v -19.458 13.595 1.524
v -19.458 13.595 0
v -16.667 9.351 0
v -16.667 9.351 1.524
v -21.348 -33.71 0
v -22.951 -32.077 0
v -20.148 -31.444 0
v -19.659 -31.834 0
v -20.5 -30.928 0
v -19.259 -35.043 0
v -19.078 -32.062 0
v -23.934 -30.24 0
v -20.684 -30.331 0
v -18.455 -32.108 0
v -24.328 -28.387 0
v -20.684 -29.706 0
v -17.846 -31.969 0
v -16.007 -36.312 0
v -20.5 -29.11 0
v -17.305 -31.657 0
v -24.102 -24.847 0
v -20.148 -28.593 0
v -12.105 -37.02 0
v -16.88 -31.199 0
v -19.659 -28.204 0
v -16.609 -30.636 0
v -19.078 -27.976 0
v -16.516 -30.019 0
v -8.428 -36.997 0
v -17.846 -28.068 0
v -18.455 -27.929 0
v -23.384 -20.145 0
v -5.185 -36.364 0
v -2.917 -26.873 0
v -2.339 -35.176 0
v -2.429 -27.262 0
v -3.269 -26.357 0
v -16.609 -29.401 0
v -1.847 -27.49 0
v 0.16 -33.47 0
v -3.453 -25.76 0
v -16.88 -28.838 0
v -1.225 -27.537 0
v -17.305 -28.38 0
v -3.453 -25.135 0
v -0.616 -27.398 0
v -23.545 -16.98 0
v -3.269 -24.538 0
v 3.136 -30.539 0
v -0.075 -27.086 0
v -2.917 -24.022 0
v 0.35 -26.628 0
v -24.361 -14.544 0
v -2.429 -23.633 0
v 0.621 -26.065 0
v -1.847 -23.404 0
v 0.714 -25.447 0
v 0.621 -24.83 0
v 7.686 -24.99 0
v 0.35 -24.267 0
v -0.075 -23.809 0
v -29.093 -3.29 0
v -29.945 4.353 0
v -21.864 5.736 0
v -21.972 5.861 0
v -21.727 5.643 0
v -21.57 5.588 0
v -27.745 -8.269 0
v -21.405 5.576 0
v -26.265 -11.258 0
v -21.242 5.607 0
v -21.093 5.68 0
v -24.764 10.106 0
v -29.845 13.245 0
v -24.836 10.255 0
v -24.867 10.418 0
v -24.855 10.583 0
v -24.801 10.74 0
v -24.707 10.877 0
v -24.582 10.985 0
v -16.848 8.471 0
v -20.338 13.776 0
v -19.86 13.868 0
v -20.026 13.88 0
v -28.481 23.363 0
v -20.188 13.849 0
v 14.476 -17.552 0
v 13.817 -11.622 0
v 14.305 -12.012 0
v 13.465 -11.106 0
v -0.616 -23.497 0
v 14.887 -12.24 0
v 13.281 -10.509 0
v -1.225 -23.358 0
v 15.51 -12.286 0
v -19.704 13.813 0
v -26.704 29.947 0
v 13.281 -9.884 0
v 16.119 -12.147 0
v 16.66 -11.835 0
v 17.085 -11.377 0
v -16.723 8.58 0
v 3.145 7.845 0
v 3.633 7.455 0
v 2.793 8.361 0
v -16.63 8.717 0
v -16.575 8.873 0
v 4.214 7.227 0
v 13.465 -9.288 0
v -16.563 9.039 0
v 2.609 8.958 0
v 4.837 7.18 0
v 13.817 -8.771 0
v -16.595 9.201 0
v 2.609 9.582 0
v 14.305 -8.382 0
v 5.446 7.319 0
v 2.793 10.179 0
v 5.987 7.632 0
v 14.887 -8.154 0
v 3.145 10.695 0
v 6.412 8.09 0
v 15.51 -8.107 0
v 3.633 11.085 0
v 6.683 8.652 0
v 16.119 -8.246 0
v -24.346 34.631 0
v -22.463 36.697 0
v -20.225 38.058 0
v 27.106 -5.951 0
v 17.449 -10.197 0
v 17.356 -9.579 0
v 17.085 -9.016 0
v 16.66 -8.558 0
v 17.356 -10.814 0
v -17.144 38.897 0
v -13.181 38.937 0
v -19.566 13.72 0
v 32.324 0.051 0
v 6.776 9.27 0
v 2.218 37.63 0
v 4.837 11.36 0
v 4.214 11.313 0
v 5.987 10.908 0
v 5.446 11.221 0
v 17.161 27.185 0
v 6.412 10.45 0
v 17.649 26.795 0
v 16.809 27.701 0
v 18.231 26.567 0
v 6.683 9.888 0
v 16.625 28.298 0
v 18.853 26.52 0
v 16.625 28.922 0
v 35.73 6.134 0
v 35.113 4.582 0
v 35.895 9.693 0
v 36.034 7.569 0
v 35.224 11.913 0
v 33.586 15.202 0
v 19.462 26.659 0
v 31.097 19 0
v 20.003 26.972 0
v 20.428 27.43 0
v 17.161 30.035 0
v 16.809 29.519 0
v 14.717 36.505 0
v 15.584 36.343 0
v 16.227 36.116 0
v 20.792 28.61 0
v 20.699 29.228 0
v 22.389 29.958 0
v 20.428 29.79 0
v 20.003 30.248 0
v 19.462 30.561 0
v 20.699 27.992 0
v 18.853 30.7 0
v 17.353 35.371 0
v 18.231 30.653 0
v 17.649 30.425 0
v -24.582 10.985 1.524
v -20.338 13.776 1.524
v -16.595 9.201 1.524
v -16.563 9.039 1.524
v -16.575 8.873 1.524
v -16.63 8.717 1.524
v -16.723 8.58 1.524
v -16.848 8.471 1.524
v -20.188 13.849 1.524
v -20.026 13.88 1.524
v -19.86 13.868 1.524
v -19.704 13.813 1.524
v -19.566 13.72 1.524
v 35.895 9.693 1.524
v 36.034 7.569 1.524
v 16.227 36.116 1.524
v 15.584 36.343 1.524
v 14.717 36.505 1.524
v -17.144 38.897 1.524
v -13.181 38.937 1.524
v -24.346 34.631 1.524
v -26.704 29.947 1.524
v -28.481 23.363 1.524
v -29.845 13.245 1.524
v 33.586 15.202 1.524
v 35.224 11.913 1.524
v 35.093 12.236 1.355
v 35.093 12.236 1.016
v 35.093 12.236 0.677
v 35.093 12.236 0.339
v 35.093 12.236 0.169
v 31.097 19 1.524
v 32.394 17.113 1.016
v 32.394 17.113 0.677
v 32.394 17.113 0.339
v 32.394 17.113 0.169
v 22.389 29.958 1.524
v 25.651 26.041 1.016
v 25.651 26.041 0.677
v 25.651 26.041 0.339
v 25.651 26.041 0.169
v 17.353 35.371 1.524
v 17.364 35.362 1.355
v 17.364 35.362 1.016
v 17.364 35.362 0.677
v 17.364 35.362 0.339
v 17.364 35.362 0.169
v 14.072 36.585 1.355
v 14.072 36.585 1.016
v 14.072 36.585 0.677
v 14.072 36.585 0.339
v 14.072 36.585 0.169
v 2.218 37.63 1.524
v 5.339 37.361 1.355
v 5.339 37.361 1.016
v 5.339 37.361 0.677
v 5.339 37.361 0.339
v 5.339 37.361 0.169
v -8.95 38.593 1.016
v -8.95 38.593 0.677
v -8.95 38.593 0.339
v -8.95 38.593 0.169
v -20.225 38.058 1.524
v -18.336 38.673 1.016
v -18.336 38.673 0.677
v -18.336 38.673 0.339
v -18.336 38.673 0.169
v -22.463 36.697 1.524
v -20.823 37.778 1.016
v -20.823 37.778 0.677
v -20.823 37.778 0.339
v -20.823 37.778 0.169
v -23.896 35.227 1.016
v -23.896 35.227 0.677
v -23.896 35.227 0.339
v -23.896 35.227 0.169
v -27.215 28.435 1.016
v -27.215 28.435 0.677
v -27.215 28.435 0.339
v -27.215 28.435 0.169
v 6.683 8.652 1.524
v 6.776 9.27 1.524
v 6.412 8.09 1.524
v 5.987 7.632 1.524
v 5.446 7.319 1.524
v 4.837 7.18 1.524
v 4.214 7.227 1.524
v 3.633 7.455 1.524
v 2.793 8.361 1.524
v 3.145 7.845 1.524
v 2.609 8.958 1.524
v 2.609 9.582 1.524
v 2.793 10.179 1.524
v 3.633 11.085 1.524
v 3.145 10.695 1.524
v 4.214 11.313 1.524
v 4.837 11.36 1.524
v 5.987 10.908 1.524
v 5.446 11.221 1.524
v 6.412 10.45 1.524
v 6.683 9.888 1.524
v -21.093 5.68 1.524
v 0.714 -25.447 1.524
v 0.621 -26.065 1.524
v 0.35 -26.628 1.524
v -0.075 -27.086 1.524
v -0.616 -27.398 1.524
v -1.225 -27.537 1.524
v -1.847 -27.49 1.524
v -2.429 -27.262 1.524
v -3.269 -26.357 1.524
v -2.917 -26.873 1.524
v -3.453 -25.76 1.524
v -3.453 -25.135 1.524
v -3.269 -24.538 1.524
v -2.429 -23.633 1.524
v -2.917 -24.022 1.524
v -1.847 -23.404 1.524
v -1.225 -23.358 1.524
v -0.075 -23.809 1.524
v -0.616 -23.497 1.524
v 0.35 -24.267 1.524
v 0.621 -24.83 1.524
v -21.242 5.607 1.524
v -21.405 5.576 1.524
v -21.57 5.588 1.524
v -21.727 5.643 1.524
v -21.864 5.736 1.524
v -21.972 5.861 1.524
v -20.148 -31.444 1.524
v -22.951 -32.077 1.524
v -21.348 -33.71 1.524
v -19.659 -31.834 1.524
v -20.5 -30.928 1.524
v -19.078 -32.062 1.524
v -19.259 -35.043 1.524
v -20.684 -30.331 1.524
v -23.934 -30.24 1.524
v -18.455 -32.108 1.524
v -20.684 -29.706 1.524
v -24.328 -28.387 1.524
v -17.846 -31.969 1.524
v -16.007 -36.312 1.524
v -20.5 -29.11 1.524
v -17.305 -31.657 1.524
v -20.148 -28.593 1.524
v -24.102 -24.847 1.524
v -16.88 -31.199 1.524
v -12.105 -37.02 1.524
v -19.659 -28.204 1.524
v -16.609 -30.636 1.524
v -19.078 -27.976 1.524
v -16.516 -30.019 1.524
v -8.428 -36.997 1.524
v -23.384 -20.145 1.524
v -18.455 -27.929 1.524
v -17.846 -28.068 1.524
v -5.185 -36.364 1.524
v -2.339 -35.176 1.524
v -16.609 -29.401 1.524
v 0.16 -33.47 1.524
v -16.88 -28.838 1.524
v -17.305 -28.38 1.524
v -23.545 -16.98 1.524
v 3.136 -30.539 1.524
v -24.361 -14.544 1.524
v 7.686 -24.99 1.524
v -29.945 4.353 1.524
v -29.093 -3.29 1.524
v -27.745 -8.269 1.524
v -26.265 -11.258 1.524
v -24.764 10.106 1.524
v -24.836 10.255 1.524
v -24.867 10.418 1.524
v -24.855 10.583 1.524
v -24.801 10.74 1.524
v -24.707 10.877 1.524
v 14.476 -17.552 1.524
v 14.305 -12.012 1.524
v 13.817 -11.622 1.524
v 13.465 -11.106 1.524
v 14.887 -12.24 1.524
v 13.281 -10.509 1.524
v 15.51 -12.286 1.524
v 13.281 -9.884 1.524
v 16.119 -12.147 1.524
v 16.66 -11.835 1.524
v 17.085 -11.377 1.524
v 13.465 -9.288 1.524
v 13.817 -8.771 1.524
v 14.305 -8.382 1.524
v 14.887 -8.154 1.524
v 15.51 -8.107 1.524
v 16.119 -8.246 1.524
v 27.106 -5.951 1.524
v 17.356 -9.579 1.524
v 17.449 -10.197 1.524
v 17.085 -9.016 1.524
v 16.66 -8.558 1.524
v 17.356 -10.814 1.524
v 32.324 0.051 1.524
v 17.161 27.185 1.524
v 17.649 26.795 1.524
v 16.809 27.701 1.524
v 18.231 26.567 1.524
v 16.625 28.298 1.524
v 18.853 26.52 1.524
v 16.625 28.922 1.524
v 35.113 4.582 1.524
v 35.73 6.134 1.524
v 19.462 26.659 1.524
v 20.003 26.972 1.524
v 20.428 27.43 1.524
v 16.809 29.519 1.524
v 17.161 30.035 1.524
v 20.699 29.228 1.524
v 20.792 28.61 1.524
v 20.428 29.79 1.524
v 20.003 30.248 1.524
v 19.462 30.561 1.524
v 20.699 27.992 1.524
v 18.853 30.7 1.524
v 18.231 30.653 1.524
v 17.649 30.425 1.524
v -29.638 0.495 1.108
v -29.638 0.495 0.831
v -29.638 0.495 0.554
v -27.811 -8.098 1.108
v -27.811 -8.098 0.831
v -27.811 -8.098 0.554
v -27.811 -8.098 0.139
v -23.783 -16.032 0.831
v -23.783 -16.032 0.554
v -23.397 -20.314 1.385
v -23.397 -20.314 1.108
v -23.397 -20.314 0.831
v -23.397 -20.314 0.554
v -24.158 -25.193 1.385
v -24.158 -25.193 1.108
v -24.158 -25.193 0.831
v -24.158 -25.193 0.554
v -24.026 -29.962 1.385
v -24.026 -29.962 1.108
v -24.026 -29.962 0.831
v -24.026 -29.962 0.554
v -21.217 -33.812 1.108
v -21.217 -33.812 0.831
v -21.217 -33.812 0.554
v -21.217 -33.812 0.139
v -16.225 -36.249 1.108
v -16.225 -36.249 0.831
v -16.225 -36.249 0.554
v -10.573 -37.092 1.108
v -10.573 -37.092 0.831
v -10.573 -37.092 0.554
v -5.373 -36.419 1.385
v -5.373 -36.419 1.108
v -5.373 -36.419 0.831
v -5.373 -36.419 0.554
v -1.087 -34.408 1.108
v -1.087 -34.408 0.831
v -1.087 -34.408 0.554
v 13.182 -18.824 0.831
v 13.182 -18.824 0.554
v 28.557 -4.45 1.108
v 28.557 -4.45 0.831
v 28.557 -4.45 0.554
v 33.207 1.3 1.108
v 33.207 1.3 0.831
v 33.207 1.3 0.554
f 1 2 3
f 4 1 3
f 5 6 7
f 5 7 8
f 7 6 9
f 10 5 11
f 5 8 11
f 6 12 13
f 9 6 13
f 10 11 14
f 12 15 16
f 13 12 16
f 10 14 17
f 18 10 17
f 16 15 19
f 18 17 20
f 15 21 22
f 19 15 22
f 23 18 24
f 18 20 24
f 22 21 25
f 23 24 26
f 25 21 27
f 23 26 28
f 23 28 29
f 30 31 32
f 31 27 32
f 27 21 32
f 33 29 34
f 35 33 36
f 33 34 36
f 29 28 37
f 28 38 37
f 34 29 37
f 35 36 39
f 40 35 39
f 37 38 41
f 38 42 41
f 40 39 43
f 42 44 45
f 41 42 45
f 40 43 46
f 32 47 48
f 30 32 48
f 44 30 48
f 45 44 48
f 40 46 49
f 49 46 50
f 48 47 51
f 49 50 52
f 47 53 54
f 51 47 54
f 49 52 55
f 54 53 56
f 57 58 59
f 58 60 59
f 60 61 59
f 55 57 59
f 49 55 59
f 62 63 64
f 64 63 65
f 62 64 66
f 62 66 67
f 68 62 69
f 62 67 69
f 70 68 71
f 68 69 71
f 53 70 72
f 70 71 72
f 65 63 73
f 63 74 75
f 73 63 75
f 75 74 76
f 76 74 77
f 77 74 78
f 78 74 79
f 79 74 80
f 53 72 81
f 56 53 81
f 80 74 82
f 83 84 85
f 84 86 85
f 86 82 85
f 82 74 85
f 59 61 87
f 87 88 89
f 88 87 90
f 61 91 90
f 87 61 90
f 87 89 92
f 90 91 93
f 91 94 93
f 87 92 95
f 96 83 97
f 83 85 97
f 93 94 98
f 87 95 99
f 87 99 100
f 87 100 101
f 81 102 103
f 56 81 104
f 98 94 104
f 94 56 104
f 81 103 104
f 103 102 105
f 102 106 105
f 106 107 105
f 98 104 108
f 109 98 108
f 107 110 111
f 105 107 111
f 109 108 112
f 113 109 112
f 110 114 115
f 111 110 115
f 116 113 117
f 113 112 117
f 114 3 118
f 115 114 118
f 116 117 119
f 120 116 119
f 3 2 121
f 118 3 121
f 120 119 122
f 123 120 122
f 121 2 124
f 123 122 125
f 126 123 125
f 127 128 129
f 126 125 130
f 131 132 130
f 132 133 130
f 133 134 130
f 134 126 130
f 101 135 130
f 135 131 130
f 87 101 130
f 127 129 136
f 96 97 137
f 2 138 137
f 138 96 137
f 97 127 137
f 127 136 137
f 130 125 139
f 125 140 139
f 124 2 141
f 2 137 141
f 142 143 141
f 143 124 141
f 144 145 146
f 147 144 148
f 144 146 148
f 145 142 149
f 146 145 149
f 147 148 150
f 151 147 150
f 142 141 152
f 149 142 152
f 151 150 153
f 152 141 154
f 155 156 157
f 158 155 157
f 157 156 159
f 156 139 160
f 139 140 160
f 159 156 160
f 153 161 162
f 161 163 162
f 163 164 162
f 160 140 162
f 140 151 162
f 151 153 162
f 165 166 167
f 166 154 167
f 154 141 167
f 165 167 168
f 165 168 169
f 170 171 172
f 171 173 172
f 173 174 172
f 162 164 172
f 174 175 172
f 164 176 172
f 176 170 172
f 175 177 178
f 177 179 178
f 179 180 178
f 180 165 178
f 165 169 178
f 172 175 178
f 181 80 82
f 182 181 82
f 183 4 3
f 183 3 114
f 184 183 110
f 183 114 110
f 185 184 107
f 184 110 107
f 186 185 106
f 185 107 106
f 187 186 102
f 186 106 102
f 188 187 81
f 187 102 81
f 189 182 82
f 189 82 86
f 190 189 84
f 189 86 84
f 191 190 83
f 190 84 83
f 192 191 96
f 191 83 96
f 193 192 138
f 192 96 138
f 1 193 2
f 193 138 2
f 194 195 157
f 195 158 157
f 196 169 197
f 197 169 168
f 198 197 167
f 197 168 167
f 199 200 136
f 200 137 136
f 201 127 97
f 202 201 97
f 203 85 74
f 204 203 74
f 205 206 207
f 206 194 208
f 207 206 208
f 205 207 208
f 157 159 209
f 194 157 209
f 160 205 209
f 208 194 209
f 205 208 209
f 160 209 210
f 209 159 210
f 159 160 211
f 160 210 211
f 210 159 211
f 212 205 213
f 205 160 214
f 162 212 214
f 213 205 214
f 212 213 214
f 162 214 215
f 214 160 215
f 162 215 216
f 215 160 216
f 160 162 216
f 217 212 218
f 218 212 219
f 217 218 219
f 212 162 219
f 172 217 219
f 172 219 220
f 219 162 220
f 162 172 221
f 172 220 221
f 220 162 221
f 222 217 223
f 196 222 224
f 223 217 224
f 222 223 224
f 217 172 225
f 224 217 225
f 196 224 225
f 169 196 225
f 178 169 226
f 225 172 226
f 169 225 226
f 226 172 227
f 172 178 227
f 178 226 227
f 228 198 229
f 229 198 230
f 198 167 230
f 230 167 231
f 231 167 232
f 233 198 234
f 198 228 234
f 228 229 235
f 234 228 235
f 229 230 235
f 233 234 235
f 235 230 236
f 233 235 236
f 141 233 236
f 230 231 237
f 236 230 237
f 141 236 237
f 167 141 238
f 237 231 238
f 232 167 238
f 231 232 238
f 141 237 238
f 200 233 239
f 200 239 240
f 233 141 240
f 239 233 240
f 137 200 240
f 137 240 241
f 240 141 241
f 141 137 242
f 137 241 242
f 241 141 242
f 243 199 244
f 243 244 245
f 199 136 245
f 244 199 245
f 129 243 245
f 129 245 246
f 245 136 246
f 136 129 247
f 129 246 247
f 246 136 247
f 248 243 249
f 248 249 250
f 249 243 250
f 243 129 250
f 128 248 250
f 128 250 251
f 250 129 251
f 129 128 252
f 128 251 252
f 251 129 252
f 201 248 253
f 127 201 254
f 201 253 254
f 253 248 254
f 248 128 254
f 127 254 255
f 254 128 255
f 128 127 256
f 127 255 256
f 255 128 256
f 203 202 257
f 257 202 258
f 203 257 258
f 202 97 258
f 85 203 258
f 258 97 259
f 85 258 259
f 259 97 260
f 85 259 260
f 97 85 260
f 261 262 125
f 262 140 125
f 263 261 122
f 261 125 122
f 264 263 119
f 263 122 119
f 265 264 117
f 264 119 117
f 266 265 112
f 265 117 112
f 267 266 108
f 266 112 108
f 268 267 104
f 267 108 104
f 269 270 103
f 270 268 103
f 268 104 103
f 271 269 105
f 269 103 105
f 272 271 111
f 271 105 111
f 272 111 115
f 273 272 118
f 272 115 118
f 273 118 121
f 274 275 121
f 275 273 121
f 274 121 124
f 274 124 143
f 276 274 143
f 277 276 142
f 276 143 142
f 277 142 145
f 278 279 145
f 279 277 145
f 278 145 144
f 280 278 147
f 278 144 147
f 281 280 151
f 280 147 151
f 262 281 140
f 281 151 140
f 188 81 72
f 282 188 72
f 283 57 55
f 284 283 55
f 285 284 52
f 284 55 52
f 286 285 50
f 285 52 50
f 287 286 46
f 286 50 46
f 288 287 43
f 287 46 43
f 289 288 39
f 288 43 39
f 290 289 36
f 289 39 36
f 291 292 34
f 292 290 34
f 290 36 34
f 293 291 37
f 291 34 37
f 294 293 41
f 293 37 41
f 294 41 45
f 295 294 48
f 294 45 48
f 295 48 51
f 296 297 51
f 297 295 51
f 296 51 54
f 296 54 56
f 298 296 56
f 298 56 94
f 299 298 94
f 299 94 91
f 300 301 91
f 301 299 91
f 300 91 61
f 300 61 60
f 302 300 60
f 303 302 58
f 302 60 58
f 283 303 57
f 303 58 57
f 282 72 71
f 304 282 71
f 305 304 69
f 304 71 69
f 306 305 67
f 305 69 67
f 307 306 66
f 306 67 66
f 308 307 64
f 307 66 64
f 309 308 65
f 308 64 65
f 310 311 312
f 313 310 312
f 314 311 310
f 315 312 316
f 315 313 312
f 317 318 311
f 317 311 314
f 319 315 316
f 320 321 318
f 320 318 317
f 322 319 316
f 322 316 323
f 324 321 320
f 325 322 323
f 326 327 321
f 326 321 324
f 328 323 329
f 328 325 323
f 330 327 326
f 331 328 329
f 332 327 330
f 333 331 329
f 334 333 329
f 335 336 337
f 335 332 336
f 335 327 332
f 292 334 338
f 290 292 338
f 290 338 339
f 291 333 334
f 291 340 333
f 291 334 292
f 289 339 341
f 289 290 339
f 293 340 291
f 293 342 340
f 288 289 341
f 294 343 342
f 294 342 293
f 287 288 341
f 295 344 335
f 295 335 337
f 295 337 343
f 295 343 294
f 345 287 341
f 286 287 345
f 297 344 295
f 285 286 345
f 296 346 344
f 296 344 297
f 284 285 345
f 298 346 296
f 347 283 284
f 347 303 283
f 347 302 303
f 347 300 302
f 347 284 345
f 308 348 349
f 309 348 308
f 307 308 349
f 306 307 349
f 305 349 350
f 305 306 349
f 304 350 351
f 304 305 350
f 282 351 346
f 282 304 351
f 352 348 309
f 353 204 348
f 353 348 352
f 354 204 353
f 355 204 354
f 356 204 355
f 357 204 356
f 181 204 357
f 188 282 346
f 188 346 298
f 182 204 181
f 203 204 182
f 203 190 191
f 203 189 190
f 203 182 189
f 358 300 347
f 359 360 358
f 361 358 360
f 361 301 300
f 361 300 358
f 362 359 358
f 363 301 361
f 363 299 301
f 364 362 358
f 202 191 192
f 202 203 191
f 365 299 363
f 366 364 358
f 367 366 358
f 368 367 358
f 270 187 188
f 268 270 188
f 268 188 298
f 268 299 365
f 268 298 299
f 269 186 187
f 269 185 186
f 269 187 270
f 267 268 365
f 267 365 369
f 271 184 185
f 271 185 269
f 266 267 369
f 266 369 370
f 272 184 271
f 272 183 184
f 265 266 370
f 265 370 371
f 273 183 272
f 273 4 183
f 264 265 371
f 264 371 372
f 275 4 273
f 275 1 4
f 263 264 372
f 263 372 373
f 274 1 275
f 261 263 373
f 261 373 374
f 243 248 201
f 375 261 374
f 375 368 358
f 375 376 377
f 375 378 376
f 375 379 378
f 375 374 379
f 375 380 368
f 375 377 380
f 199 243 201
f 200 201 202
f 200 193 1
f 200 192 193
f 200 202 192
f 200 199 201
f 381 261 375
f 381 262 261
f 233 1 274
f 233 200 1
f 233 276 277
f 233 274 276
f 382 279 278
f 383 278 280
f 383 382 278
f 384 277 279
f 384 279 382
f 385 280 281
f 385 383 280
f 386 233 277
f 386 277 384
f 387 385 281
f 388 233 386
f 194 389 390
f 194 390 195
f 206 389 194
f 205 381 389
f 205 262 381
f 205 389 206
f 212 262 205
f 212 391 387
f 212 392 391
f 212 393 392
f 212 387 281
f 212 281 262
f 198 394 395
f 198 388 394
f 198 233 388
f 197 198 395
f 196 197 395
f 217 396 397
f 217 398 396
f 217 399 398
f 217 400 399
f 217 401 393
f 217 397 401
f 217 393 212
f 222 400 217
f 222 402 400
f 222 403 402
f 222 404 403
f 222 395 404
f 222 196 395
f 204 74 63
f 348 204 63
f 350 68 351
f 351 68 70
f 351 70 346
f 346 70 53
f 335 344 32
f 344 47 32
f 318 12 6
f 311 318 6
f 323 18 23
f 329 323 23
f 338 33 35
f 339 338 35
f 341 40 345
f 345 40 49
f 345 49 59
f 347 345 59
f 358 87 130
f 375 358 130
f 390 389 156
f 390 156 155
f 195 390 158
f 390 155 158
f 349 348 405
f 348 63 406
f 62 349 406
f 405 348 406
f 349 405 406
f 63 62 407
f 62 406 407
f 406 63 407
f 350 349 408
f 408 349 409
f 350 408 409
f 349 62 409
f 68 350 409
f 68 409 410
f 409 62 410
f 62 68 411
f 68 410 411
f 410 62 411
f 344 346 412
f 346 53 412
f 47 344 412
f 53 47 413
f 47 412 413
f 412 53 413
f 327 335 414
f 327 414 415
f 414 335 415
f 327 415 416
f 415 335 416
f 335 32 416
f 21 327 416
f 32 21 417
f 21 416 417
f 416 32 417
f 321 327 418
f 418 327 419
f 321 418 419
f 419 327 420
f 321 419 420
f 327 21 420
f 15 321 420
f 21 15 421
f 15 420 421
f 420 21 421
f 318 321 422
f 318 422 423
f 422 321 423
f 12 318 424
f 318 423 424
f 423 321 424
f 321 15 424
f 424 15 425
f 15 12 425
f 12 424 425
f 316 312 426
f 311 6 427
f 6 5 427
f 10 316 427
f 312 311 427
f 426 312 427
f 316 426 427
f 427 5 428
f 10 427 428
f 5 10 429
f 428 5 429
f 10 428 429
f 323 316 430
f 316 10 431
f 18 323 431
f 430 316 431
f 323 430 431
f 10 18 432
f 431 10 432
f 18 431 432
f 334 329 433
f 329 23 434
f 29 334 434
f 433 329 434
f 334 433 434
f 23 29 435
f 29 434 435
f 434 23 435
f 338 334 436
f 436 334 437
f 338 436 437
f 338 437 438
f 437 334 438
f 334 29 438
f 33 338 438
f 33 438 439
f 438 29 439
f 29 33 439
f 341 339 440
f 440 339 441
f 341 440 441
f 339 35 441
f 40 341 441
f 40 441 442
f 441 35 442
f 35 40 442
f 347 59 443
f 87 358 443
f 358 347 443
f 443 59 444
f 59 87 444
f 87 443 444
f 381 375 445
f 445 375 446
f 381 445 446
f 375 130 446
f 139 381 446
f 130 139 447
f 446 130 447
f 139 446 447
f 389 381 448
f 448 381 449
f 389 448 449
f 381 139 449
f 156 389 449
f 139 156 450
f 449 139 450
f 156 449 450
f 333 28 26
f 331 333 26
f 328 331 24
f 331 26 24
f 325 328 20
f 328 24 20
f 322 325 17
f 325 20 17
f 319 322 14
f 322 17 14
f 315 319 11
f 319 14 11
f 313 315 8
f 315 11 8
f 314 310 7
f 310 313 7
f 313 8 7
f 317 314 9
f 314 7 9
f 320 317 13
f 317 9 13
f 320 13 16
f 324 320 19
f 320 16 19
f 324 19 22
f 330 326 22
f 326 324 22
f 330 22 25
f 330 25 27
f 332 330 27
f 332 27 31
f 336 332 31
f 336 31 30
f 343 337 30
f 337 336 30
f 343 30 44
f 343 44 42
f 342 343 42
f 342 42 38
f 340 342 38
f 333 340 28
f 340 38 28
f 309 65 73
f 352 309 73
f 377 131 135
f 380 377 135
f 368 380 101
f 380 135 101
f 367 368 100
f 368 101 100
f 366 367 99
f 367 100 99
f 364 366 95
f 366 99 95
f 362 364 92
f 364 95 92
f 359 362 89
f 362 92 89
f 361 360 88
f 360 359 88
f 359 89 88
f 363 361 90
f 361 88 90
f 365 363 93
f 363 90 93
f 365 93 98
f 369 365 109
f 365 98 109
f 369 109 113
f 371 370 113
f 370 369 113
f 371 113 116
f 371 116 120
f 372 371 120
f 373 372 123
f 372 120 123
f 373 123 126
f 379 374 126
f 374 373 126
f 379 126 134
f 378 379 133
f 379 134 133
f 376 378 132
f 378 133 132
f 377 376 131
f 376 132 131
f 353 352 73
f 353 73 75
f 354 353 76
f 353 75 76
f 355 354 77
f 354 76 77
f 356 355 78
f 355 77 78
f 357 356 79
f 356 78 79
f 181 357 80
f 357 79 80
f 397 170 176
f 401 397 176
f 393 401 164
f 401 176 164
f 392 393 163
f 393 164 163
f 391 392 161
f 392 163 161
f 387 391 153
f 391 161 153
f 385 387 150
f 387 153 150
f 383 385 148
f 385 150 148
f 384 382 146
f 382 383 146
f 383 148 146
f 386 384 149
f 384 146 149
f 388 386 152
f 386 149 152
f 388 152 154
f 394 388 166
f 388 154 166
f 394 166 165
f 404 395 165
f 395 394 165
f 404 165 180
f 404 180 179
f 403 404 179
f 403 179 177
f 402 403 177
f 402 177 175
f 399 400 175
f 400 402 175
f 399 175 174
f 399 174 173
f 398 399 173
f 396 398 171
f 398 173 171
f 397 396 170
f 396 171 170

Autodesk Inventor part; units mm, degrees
ref_plane "YZ Plane" through (0, 0, 0) normal (1, 0, 0) x (0, 1, 0)
ref_plane "XZ Plane" through (0, 0, 0) normal (0, 1, 0) x (-1, 0, 0)
ref_plane "XY Plane" through (0, 0, 0) normal (0, 0, 1) x (1, 0, 0)
sketch "Sketch1" plane through (0, 0, 0) normal (0, 0, 1) x (1, 0, 0)
  spline S0 degree 4 poles (36.0337, 7.5688) (36.414, 11.9825) (28.7931, 22.5974) (17.6153, 35.7287) (16.2127, 36.4244) (12.1158, 36.7774) (8.4963, 37.0893) (2.2009, 37.6317) (-1.6462, 37.9632) (-16.3236, 39.2278) (-18.5834, 39.4225) (-28.021, 34.4139) (-29.8449, 13.245) knots -10 -10 -10 -10 -10 -9 -8 -7 -6 -5 -4 -3 -2 -1 -1 -1 -1 -1 projected
  spline S1 degree 4 poles (-29.8449, 13.245) (-30.3855, 6.9715) (-29.3895, -8.4449) (-25.0846, -11.9416) (-21.5103, -19.5684) (-27.4136, -30.8853) (-16.5352, -37.6974) (-4.2729, -37.5026) (2.5545, -32.1215) (9.356, -22.2279) (17.0371, -15.0646) (23.4948, -9.4314) (30.8769, -2.7502) (35.7978, 4.8301) (36.0337, 7.5688) knots -12 -12 -12 -12 -12 -11 -10 -9 -8 -7 -6 -5 -4 -3 -2 -1 -1 -1 -1 -1 projected
  circle A0 centre (-1.3811, -25.4474) radius 2.0955 projected
  circle A1 centre (-18.6117, -30.0188) radius 2.0955 projected
  circle A2 centre (18.6969, 28.61) radius 2.0955 projected
  circle A3 centre (15.3532, -10.1968) radius 2.0955 projected
  arc A4 (-24.582, 10.9851) -> (-24.7636, 10.1056) centre (-24.233, 10.4545) ccw projected
  line L0 (-24.582, 10.9851) -> (-20.3376, 13.7765) projected
  arc A5 (-19.4581, 13.5949) -> (-20.3376, 13.7765) centre (-19.9887, 13.246) ccw projected
  line L1 (-19.4581, 13.5949) -> (-16.6667, 9.3506) projected
  arc A6 (-16.8484, 8.4711) -> (-16.6667, 9.3506) centre (-17.1973, 9.0016) ccw projected
  line L2 (-16.8484, 8.4711) -> (-21.0927, 5.6797) projected
  arc A7 (-21.9722, 5.8613) -> (-21.0927, 5.6797) centre (-21.4416, 6.2102) ccw projected
  line L3 (-21.9722, 5.8613) -> (-24.7636, 10.1056) projected
  circle A8 centre (4.6807, 9.27) radius 2.0955
  line L4 (-17.1973, 9.0016) -> (-24.233, 10.4545) construction
  point P0 (-20.7152, 9.7281)
  dimension "d9" = 4.191
extrude "Extrusion1" add sketch "Sketch1" along normal blind 1.524
properties part number "tracking-wheet-outer-mount-v2"
